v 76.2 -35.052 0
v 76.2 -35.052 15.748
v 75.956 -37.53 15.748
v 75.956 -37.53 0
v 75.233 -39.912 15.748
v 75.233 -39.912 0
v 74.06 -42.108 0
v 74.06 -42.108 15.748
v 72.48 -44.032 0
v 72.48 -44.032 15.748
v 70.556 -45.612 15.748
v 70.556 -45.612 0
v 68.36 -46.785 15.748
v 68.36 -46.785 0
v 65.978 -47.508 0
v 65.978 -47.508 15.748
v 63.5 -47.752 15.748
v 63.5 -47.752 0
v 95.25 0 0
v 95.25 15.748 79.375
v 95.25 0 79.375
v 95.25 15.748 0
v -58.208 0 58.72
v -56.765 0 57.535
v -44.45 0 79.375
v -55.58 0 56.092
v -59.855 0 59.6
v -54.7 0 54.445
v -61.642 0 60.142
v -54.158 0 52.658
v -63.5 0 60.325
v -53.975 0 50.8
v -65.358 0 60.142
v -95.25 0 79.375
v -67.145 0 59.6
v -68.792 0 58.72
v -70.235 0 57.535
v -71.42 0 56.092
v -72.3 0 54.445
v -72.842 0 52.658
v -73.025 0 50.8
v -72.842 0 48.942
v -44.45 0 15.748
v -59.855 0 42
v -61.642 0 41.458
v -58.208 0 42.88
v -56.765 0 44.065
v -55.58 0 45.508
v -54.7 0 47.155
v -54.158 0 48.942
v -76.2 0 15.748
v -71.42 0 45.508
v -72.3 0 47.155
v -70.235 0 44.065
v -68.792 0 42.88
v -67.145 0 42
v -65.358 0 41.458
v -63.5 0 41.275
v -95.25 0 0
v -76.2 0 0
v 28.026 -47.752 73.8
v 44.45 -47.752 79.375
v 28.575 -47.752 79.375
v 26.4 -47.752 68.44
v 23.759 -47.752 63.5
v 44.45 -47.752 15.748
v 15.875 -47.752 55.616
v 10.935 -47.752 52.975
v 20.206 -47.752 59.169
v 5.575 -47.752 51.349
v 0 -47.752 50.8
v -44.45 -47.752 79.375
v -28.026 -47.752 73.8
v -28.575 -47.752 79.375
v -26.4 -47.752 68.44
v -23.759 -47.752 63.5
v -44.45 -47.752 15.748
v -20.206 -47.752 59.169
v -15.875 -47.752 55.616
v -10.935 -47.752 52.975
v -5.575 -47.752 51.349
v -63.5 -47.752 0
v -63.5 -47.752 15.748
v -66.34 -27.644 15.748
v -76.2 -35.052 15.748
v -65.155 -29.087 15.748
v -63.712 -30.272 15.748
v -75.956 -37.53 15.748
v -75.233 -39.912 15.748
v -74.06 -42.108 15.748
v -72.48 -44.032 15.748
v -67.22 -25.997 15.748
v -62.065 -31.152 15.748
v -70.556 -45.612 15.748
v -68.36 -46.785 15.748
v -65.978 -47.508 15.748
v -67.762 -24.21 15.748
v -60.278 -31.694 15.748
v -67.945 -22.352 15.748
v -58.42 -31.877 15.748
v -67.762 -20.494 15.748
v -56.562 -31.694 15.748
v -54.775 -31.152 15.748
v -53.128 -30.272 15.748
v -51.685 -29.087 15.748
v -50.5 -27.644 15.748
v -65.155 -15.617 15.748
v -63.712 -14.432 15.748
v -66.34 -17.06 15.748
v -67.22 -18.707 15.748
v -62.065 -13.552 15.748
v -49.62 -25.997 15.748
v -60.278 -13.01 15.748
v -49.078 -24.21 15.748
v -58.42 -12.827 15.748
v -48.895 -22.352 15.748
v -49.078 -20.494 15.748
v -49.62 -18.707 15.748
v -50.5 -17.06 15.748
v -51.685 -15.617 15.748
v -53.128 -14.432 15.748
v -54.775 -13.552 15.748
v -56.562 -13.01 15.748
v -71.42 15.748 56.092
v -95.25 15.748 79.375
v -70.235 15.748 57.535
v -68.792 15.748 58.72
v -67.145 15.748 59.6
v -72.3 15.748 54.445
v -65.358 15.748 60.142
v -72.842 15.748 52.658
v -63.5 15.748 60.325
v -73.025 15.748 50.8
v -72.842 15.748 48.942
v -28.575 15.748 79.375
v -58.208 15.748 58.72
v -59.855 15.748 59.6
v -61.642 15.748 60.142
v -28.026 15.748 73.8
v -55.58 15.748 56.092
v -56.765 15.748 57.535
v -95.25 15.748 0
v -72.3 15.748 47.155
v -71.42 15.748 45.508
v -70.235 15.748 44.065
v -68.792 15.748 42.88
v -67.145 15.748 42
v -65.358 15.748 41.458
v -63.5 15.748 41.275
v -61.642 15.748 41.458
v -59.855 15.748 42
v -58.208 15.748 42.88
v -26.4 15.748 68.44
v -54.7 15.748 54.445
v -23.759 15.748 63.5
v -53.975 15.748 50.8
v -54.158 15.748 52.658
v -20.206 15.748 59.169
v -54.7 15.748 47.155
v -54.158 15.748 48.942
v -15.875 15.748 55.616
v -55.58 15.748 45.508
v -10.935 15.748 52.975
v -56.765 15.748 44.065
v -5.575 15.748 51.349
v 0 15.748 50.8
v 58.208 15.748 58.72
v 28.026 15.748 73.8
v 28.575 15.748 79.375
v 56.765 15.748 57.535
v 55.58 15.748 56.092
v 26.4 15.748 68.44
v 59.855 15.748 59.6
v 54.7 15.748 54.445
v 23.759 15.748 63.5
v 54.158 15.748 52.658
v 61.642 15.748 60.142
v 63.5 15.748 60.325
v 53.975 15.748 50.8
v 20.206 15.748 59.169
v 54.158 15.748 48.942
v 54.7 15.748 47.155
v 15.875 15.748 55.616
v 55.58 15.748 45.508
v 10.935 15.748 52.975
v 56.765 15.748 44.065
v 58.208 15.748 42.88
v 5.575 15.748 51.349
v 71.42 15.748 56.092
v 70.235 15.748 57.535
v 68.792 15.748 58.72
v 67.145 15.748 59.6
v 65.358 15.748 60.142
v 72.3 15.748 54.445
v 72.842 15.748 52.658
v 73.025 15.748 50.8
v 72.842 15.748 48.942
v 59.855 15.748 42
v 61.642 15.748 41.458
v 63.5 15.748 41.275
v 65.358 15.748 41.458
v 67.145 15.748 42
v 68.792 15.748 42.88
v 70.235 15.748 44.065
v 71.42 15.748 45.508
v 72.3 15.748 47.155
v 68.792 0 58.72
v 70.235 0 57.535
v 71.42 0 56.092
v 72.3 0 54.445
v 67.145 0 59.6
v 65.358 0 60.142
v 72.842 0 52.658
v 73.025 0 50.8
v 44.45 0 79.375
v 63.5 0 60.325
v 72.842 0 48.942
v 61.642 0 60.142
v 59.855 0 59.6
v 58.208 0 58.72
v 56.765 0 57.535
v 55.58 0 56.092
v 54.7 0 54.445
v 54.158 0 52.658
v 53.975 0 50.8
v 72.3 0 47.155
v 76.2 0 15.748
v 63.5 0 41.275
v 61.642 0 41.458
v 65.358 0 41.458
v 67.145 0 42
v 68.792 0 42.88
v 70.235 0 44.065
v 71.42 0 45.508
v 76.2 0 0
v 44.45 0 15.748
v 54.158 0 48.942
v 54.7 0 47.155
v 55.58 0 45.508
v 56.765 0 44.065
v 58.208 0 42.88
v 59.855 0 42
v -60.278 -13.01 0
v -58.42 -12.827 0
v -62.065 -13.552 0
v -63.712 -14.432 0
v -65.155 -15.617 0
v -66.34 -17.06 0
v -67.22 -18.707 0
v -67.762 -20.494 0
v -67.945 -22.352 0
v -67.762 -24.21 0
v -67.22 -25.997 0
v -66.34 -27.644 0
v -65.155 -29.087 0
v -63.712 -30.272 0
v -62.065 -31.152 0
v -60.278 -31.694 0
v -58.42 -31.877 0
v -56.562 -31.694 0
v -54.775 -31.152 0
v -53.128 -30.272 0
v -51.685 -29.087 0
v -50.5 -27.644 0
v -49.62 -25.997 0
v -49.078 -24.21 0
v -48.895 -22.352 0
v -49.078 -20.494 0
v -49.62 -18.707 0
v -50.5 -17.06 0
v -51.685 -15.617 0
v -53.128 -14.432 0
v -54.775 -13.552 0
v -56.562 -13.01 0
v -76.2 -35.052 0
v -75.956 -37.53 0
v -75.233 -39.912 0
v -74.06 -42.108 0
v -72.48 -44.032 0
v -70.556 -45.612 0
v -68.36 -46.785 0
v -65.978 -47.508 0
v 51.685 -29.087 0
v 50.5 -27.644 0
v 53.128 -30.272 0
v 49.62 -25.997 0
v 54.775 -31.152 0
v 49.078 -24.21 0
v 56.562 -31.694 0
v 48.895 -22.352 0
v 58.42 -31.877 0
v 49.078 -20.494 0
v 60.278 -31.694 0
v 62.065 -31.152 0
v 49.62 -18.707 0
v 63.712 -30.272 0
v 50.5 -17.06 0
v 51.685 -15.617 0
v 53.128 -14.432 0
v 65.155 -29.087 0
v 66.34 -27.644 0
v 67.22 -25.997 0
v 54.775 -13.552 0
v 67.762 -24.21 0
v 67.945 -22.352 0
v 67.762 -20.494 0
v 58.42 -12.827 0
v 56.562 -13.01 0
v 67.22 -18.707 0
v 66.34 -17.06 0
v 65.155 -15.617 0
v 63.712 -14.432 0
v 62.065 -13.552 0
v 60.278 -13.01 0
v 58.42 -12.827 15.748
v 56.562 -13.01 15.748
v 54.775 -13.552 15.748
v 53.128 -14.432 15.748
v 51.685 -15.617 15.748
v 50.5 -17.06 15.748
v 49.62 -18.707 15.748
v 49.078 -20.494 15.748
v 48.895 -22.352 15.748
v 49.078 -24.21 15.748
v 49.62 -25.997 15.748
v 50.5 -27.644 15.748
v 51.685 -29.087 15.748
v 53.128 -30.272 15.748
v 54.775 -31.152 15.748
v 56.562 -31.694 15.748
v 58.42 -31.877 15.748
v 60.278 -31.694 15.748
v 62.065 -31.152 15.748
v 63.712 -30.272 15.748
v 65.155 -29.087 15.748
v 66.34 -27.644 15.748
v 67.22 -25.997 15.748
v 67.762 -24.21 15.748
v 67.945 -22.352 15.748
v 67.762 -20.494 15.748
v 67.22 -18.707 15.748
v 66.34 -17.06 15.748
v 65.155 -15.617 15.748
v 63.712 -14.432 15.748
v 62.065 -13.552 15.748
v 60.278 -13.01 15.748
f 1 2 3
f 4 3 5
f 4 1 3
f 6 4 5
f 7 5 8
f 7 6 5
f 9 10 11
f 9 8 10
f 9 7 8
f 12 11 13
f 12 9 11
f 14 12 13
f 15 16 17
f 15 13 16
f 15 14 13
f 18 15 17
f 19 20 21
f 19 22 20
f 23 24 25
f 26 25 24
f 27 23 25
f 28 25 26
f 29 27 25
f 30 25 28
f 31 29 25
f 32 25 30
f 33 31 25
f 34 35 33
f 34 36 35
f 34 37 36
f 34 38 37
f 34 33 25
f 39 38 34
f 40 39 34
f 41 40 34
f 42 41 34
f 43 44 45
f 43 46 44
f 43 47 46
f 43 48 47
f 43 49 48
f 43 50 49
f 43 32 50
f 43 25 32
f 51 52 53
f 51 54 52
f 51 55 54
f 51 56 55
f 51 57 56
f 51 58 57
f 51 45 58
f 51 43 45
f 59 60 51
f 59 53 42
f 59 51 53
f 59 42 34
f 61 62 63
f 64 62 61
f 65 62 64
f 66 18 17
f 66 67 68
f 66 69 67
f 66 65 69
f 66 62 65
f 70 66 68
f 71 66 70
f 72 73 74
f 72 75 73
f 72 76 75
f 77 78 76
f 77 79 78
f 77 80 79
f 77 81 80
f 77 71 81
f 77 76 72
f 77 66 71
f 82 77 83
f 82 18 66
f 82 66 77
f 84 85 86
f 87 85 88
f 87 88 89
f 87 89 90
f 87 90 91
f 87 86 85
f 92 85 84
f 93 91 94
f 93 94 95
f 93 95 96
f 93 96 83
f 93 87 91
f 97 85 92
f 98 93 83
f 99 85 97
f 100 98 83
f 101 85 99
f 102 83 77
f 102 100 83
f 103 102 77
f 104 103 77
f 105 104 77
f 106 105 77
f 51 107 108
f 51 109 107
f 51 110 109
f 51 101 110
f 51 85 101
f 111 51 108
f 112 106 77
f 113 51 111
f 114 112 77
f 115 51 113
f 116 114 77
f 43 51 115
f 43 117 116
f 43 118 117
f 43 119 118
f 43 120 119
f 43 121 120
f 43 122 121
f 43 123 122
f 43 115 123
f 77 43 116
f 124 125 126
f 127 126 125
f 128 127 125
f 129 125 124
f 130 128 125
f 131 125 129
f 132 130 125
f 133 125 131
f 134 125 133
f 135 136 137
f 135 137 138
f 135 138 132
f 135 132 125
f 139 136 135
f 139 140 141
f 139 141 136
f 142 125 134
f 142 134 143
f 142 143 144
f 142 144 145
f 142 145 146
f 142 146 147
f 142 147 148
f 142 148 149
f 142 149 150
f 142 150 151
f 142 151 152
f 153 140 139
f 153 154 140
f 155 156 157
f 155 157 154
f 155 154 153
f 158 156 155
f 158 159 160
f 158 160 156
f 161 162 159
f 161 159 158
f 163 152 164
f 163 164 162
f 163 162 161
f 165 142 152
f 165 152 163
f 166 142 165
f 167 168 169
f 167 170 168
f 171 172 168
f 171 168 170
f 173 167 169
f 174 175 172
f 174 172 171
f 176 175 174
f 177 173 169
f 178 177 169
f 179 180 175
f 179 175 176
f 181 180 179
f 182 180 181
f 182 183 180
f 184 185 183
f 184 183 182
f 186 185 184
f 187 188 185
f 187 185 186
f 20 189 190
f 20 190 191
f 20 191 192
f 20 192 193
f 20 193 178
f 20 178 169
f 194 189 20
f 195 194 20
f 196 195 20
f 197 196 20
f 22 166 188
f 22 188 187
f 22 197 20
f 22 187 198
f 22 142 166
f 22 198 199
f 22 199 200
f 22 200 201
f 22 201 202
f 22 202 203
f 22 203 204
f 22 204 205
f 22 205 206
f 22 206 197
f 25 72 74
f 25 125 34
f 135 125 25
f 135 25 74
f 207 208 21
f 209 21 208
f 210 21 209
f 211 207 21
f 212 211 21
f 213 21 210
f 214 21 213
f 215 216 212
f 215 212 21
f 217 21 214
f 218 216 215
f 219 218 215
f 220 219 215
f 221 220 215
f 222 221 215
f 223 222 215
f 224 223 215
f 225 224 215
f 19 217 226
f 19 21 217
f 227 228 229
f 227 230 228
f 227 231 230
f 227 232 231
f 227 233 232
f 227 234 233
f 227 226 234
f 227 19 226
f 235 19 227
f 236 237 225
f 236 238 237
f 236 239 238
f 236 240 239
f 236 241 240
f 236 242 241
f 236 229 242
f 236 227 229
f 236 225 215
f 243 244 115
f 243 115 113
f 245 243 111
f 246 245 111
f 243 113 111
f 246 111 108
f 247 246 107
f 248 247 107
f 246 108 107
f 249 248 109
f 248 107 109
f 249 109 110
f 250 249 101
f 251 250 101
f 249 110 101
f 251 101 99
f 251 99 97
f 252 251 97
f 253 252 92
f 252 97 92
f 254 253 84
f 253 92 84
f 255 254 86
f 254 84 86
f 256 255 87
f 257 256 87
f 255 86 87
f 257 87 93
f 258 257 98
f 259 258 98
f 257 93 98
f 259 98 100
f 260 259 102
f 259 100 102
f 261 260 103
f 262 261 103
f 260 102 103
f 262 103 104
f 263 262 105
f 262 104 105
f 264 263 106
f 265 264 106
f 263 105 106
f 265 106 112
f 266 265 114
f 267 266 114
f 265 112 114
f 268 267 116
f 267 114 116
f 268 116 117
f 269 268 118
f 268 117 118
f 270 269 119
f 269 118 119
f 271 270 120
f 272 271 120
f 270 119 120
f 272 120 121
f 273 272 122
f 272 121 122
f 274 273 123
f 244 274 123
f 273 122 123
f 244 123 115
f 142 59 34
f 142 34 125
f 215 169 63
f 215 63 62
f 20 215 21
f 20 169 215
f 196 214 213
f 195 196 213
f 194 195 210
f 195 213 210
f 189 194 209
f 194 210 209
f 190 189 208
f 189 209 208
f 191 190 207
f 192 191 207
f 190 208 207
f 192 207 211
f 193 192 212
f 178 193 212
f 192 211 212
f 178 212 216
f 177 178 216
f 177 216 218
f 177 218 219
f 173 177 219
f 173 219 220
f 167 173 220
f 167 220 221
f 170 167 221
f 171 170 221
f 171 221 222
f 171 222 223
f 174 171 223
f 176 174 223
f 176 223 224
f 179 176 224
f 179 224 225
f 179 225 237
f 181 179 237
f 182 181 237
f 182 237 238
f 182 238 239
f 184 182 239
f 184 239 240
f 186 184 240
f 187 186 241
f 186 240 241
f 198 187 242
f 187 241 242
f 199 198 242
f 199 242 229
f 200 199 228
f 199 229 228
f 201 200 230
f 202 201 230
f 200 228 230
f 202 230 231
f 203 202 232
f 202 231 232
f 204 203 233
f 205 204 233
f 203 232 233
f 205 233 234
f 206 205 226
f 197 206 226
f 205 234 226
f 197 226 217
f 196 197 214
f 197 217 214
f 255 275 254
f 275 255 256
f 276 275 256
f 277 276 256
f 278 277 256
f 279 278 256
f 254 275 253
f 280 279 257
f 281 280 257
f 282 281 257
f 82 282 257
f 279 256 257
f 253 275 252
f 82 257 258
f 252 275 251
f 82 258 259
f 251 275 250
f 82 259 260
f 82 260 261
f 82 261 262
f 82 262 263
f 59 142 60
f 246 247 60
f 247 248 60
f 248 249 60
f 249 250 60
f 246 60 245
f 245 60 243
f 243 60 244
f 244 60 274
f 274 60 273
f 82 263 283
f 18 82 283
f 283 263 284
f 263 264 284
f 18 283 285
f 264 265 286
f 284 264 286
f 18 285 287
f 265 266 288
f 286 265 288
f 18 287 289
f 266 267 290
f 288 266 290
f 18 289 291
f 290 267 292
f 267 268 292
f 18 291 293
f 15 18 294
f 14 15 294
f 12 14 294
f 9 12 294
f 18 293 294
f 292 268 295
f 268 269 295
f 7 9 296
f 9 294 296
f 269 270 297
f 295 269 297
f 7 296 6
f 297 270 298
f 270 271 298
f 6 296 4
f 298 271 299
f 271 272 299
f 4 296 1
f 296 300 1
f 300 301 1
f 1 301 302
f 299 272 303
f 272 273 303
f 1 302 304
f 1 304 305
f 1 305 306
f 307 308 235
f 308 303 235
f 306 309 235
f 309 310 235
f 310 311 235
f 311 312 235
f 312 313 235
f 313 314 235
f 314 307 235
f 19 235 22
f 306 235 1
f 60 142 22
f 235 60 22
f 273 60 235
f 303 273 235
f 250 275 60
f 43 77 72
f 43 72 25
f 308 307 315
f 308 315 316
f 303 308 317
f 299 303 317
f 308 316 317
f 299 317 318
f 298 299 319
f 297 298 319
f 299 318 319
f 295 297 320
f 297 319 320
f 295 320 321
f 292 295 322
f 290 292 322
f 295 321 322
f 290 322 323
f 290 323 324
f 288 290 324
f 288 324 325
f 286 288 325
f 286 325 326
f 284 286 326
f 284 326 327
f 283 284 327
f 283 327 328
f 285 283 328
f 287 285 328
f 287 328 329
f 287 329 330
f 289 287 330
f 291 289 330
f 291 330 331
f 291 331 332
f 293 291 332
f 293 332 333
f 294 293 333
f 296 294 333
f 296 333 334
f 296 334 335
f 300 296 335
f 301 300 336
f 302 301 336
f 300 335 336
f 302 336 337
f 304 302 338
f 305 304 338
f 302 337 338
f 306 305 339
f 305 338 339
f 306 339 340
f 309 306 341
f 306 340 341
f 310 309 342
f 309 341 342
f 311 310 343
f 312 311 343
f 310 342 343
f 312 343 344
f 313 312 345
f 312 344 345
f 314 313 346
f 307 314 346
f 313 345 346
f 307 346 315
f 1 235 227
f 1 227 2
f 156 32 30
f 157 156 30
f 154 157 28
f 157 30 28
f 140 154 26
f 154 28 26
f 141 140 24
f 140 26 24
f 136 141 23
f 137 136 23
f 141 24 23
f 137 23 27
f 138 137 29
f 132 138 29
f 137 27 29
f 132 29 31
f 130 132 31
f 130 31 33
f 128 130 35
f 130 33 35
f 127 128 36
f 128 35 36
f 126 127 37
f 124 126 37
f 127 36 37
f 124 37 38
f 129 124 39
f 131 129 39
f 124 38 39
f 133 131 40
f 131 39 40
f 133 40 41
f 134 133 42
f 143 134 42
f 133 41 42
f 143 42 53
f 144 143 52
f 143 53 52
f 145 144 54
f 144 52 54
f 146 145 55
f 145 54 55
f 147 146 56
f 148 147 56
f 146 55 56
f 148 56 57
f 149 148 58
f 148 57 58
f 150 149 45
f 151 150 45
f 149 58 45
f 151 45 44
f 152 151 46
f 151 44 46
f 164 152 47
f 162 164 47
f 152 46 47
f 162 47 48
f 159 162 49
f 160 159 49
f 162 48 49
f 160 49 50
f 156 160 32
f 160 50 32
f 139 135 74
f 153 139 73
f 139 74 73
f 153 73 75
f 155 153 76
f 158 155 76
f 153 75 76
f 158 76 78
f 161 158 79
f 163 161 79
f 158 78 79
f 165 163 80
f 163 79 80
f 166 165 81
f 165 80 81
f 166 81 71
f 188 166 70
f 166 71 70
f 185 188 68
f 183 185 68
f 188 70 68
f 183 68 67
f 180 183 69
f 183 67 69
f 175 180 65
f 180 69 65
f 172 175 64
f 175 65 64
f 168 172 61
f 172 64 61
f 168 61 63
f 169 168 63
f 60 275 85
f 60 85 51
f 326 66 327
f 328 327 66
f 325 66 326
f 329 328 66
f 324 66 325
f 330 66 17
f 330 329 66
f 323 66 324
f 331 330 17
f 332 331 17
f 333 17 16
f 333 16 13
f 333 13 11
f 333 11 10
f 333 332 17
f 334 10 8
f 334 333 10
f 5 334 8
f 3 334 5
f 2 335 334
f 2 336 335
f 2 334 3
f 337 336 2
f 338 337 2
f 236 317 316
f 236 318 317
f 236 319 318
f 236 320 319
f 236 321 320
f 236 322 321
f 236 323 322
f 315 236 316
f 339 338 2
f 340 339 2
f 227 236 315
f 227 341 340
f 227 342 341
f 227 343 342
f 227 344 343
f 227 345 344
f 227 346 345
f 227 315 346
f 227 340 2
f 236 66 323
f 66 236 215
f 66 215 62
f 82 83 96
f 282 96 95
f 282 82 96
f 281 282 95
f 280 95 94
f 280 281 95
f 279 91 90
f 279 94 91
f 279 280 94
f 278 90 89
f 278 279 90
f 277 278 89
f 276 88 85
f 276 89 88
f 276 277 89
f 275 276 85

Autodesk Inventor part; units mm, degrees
ref_plane "YZ Plane" through (0, 0, 0) normal (1, 0, 0) x (0, 1, 0)
ref_plane "XZ Plane" through (0, 0, 0) normal (0, 1, 0) x (-1, 0, 0)
ref_plane "XY Plane" through (0, 0, 0) normal (0, 0, 1) x (1, 0, 0)
sketch "Sketch1" plane through (0, 0, 0) normal (0, 0, 1) x (1, 0, 0)
  line L0 (-95.25, 15.748) -> (95.25, 15.748)
  line L1 (95.25, 15.748) -> (95.25, 0)
  line L2 (95.25, 0) -> (-95.25, 0)
  line L3 (-95.25, 0) -> (-95.25, 15.748)
  line L4 (-76.2, 0) -> (76.2, 0)
  line L5 (76.2, 0) -> (76.2, -35.052)
  line L6 (63.5, -47.752) -> (-63.5, -47.752)
  line L7 (-76.2, -35.052) -> (-76.2, 0)
  arc A0 (-76.2, -35.052) -> (-63.5, -47.752) centre (-63.5, -35.052) ccw
  arc A1 (63.5, -47.752) -> (76.2, -35.052) centre (63.5, -35.052) ccw
  line L8 (-58.42, -22.352) -> (58.42, -22.352) construction
  line L9 (-58.42, -22.352) -> (58.42, -22.352) construction
  line L10 (0, -22.352) -> (0, -47.752) construction
  line L11 (-44.45, 15.748) -> (44.45, 15.748)
  line L12 (44.45, 15.748) -> (44.45, -47.752)
  line L13 (44.45, -47.752) -> (-44.45, -47.752)
  line L14 (-44.45, -47.752) -> (-44.45, 15.748)
  point P0 (0, 0)
  point P1 (0, 0)
  point P2 (0, 15.748)
  dimension "d0" = 190.5
  dimension "d1" = 15.748
  dimension "d4" = 63.5
  dimension "d5" = 152.4
  dimension "d6" = 12.7
  dimension "d7" = 12.7
  dimension "d8" = 116.84
  dimension "d9" = 0
  dimension "d10" = 25.4
  dimension "d11" = 63.5
  dimension "d12" = 88.9
extrude "Extrusion1" add sketch "Sketch1" along normal blind 79.375 contours L0 L14 L2 L3 | L0 L12 L2 L14 | L0 L1 L2 L12 | L2 L12 L6 L14
extrude "Extrusion2" add sketch "Sketch1" along normal blind 15.748 contours L14 L6 A0 L7 L2 | L2 L12 L6 L14 | L2 L5 A1 L6 L12
sketch "Sketch2" plane through (-44.45, -47.752, 79.375) normal (0, -1, 0) x (1, 0, 0)
  line L0 (139.7, 0) -> (-50.8, 0) construction
  circle A0 centre (44.45, 0) radius 28.575
  line L1 (-19.05, 0) -> (107.95, 0) construction
  line L2 (0, 0) -> (88.9, 0) construction
  line L3 (-19.05, 0) -> (-19.05, -28.575) construction
  line L4 (44.45, 0) -> (44.45, -8.2892) construction
  circle A1 centre (-19.05, -28.575) radius 9.525
  circle A2 centre (107.95, -28.575) radius 9.525
  point P0 (44.45, -79.375)
  dimension "d17" = 57.15
  dimension "d18" = 127
  dimension "d23" = 28.575
  dimension "d24" = 19.05
extrude "Extrusion3" cut sketch "Sketch2" against normal blind 63.5
hole "Hole1" at (-58.42, -22.352, 0) at (58.42, -22.352, 0) direction (0, 0, 1) diameter 19.05 end through all
properties part number "B"
